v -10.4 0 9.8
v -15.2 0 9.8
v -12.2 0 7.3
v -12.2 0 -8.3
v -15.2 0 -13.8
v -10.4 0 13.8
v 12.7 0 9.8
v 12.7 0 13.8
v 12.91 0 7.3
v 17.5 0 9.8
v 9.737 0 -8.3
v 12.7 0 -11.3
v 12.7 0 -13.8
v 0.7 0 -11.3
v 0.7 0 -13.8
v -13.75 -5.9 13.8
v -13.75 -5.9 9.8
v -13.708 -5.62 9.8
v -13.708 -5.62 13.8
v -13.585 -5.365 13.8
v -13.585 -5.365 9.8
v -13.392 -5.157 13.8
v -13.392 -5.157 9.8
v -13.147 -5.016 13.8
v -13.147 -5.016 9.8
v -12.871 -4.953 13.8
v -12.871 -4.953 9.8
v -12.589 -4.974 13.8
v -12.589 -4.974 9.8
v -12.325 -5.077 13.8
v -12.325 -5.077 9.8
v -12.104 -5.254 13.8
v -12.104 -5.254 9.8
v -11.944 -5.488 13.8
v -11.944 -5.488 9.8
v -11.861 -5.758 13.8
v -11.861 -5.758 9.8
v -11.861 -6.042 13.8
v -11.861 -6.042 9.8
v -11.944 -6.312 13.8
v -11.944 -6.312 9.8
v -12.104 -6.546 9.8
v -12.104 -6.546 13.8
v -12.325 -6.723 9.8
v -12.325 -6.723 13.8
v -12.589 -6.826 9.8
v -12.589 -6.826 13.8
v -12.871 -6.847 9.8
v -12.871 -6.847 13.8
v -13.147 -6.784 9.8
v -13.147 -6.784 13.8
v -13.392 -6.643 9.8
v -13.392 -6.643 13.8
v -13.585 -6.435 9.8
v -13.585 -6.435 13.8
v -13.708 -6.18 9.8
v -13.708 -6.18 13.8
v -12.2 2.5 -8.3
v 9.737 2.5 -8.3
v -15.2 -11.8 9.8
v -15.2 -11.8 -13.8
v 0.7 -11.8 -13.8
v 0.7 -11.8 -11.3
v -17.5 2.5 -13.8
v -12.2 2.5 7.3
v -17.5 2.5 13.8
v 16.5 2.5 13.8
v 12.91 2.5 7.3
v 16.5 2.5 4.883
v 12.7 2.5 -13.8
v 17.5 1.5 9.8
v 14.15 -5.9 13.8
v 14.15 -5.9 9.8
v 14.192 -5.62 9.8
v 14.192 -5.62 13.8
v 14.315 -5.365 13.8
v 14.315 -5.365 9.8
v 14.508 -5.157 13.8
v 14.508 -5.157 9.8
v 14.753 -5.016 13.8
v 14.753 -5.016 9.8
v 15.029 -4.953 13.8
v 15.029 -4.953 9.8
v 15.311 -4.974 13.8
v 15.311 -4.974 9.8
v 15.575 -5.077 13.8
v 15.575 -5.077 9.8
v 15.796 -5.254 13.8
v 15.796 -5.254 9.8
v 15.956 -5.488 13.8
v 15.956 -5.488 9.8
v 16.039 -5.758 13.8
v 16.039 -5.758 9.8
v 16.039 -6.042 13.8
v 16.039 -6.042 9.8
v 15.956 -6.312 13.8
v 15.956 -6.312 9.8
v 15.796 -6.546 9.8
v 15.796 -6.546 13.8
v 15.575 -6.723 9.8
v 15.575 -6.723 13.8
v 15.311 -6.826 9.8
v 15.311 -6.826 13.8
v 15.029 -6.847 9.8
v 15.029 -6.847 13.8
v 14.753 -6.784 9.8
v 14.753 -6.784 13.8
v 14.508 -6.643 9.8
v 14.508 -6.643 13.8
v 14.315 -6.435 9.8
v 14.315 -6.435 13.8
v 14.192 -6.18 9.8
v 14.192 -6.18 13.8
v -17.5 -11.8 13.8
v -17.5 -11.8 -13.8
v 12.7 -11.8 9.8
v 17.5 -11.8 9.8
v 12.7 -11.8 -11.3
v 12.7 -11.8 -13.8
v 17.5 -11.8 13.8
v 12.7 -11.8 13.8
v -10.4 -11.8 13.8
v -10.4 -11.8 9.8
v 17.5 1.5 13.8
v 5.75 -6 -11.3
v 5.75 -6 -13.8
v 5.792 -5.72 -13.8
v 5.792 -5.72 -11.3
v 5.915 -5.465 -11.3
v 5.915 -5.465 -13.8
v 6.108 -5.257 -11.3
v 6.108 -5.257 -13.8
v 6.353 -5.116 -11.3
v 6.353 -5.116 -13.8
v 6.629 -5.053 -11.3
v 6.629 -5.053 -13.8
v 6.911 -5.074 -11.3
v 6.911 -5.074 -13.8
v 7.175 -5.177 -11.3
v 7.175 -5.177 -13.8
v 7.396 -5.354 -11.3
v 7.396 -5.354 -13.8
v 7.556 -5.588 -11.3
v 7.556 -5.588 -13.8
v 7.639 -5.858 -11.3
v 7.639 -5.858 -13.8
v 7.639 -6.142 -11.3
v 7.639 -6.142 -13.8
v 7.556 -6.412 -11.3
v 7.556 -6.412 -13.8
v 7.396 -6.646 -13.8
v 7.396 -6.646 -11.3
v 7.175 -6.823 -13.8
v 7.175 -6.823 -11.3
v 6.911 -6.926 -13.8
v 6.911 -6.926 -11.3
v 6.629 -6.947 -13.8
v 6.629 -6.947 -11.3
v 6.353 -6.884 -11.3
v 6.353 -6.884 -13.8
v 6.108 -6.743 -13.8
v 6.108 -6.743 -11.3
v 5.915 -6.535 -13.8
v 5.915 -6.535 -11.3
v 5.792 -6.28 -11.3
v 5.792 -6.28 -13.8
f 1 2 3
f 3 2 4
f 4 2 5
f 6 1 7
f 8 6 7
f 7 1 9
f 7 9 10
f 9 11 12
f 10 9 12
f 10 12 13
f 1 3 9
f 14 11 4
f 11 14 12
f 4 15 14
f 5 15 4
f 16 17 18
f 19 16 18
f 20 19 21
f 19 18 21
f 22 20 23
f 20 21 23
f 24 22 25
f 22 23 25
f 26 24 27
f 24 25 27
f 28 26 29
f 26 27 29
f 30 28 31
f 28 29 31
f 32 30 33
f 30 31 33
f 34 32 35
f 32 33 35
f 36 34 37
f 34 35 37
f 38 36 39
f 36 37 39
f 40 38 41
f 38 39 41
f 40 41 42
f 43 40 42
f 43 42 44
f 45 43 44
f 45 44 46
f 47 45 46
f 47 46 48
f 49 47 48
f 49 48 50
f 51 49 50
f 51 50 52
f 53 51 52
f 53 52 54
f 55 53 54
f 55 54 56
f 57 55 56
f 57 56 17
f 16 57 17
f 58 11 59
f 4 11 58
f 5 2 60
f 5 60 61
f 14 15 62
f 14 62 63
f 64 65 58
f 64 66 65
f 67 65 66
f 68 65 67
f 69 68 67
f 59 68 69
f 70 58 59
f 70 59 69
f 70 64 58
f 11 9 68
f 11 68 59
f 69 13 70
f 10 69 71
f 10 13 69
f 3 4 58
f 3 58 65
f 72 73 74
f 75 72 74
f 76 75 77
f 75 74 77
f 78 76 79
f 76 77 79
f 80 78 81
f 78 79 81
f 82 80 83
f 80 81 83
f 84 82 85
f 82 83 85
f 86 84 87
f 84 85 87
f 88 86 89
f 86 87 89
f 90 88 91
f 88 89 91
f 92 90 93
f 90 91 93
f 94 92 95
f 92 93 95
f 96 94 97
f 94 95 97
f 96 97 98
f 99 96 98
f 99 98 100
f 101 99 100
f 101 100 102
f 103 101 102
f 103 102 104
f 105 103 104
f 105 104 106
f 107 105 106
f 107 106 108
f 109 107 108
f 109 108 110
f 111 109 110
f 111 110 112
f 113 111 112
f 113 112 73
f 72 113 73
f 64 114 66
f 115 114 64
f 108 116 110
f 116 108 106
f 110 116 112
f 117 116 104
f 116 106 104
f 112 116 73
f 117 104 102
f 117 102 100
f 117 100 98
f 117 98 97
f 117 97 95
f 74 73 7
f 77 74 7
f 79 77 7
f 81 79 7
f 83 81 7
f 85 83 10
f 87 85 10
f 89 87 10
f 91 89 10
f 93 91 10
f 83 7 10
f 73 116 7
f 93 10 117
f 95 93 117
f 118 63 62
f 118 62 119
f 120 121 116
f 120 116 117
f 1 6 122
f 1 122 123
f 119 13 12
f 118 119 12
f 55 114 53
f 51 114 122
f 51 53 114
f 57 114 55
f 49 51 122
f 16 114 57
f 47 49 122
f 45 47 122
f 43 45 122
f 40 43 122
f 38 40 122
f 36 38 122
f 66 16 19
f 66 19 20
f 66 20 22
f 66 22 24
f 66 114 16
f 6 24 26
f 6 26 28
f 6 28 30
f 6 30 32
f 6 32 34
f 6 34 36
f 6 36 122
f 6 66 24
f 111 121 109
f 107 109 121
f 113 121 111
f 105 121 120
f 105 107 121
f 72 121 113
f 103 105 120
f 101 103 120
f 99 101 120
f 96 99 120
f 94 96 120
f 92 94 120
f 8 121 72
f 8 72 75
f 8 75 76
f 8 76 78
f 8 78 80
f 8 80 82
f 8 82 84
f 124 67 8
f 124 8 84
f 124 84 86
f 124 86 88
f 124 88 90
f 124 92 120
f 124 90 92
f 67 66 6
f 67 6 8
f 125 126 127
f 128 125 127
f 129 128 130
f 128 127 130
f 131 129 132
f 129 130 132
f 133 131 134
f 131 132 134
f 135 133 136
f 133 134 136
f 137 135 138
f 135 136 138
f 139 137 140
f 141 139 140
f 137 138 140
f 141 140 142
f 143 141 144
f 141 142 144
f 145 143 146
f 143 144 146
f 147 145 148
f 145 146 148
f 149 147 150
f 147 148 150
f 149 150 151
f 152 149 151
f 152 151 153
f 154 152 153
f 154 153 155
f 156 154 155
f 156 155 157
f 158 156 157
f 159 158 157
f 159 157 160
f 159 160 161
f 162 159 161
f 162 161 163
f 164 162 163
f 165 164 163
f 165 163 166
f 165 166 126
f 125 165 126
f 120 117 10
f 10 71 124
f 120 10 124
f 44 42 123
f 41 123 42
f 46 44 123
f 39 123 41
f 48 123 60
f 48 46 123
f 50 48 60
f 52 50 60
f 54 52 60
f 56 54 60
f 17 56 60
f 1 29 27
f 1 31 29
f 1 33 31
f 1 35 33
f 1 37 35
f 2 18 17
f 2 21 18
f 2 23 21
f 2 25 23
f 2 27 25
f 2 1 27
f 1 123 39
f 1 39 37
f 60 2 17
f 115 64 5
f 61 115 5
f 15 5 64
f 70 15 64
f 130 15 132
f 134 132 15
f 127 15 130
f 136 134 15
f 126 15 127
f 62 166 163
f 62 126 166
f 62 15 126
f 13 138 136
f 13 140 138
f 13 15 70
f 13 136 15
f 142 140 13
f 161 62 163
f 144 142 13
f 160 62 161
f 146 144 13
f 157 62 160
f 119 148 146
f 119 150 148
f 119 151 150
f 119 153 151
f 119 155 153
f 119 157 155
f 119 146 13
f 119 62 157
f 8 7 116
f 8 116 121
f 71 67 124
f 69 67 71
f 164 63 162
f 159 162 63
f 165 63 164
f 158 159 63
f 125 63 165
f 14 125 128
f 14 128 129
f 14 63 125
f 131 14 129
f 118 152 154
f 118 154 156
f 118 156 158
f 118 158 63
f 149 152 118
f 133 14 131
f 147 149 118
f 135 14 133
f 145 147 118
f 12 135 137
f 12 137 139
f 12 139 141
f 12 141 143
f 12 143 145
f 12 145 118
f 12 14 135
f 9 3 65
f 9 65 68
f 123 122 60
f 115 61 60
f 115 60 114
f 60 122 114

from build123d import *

# Parameters (mm, degrees)
SKETCH2_W           = 35
SKETCH2_H           = 27.6
BOSS_EXTRUDE1_DEPTH = 2.5
SKETCH3_W           = 12
SKETCH3_H           = 2.5
SKETCH3_W_2         = 4.8
SKETCH3_H_2         = 4
BOSS_EXTRUDE2_DEPTH = 11.8
SKETCH5_R           = 0.95
CUT_EXTRUDE2_DEPTH  = 11.8
SKETCH6_R           = 0.95
CUT_EXTRUDE3_DEPTH  = 11.8
CUT_EXTRUDE6_DEPTH  = 10
CHAMFER1_SIZE       = 1


with BuildPart() as part:
    # Sketch2 → Boss-Extrude1 (new body)
    with BuildSketch(Plane(origin=(0, 0, 0), x_dir=(1, 0, 0), z_dir=(0, 1, 0))):
        Rectangle(SKETCH2_W, SKETCH2_H)
    extrude(amount=BOSS_EXTRUDE1_DEPTH)

    # Sketch3 → Boss-Extrude2 (add)
    with BuildSketch(Plane.XZ):
        with Locations((6.7, -12.55)):
            Rectangle(SKETCH3_W, SKETCH3_H)
        with Locations((15.1, 11.8)):
            Rectangle(SKETCH3_W_2, SKETCH3_H_2)
        Polygon((-17.5, 13.8), (-15.2, 13.8), (-10.4, 13.8), (-10.4, 9.8), (-15.2, 9.8), (-15.2, -13.8), (-17.5, -13.8), align=None)
    extrude(amount=BOSS_EXTRUDE2_DEPTH)

    # Sketch5 → Cut-Extrude2 (cut)
    with BuildSketch(Plane(origin=(0, 0, -13.8), x_dir=(-1, 0, 0), z_dir=(0, 0, -1))):
        with Locations((-6.7, -6)):
            Circle(SKETCH5_R)
    extrude(amount=-CUT_EXTRUDE2_DEPTH, mode=Mode.SUBTRACT)

    # Sketch6 → Cut-Extrude3 (cut)
    with BuildSketch(Plane(origin=(0, 0, 9.8), x_dir=(-1, 0, 0), z_dir=(0, 0, -1))):
        with Locations((-15.1, -5.9)):
            Circle(SKETCH6_R)
        with Locations((12.8, -5.9)):
            Circle(SKETCH6_R)
    extrude(amount=-CUT_EXTRUDE3_DEPTH, mode=Mode.SUBTRACT)

    # Sketch11 → Cut-Extrude6 (cut)
    with BuildSketch(Plane(origin=(0, 0, 0), x_dir=(-1, 0, 0), z_dir=(0, -1, 0))):
        Polygon((-12.7, 13.8), (-17.5, -9.8), (-17.5, 13.8), align=None)
        Polygon((-12.909628956, -7.3), (-9.7367476, 8.3), (12.2, 8.3), (12.2, -7.3), align=None)
    extrude(amount=-CUT_EXTRUDE6_DEPTH, mode=Mode.SUBTRACT)

    # Chamfer1
    chamfer1_edges = [part.edges().sort_by_distance(p)[0] for p in [
        (17.5, 2.5, 11.8),
    ]]
    chamfer(chamfer1_edges, length=CHAMFER1_SIZE)


solid = part.part
